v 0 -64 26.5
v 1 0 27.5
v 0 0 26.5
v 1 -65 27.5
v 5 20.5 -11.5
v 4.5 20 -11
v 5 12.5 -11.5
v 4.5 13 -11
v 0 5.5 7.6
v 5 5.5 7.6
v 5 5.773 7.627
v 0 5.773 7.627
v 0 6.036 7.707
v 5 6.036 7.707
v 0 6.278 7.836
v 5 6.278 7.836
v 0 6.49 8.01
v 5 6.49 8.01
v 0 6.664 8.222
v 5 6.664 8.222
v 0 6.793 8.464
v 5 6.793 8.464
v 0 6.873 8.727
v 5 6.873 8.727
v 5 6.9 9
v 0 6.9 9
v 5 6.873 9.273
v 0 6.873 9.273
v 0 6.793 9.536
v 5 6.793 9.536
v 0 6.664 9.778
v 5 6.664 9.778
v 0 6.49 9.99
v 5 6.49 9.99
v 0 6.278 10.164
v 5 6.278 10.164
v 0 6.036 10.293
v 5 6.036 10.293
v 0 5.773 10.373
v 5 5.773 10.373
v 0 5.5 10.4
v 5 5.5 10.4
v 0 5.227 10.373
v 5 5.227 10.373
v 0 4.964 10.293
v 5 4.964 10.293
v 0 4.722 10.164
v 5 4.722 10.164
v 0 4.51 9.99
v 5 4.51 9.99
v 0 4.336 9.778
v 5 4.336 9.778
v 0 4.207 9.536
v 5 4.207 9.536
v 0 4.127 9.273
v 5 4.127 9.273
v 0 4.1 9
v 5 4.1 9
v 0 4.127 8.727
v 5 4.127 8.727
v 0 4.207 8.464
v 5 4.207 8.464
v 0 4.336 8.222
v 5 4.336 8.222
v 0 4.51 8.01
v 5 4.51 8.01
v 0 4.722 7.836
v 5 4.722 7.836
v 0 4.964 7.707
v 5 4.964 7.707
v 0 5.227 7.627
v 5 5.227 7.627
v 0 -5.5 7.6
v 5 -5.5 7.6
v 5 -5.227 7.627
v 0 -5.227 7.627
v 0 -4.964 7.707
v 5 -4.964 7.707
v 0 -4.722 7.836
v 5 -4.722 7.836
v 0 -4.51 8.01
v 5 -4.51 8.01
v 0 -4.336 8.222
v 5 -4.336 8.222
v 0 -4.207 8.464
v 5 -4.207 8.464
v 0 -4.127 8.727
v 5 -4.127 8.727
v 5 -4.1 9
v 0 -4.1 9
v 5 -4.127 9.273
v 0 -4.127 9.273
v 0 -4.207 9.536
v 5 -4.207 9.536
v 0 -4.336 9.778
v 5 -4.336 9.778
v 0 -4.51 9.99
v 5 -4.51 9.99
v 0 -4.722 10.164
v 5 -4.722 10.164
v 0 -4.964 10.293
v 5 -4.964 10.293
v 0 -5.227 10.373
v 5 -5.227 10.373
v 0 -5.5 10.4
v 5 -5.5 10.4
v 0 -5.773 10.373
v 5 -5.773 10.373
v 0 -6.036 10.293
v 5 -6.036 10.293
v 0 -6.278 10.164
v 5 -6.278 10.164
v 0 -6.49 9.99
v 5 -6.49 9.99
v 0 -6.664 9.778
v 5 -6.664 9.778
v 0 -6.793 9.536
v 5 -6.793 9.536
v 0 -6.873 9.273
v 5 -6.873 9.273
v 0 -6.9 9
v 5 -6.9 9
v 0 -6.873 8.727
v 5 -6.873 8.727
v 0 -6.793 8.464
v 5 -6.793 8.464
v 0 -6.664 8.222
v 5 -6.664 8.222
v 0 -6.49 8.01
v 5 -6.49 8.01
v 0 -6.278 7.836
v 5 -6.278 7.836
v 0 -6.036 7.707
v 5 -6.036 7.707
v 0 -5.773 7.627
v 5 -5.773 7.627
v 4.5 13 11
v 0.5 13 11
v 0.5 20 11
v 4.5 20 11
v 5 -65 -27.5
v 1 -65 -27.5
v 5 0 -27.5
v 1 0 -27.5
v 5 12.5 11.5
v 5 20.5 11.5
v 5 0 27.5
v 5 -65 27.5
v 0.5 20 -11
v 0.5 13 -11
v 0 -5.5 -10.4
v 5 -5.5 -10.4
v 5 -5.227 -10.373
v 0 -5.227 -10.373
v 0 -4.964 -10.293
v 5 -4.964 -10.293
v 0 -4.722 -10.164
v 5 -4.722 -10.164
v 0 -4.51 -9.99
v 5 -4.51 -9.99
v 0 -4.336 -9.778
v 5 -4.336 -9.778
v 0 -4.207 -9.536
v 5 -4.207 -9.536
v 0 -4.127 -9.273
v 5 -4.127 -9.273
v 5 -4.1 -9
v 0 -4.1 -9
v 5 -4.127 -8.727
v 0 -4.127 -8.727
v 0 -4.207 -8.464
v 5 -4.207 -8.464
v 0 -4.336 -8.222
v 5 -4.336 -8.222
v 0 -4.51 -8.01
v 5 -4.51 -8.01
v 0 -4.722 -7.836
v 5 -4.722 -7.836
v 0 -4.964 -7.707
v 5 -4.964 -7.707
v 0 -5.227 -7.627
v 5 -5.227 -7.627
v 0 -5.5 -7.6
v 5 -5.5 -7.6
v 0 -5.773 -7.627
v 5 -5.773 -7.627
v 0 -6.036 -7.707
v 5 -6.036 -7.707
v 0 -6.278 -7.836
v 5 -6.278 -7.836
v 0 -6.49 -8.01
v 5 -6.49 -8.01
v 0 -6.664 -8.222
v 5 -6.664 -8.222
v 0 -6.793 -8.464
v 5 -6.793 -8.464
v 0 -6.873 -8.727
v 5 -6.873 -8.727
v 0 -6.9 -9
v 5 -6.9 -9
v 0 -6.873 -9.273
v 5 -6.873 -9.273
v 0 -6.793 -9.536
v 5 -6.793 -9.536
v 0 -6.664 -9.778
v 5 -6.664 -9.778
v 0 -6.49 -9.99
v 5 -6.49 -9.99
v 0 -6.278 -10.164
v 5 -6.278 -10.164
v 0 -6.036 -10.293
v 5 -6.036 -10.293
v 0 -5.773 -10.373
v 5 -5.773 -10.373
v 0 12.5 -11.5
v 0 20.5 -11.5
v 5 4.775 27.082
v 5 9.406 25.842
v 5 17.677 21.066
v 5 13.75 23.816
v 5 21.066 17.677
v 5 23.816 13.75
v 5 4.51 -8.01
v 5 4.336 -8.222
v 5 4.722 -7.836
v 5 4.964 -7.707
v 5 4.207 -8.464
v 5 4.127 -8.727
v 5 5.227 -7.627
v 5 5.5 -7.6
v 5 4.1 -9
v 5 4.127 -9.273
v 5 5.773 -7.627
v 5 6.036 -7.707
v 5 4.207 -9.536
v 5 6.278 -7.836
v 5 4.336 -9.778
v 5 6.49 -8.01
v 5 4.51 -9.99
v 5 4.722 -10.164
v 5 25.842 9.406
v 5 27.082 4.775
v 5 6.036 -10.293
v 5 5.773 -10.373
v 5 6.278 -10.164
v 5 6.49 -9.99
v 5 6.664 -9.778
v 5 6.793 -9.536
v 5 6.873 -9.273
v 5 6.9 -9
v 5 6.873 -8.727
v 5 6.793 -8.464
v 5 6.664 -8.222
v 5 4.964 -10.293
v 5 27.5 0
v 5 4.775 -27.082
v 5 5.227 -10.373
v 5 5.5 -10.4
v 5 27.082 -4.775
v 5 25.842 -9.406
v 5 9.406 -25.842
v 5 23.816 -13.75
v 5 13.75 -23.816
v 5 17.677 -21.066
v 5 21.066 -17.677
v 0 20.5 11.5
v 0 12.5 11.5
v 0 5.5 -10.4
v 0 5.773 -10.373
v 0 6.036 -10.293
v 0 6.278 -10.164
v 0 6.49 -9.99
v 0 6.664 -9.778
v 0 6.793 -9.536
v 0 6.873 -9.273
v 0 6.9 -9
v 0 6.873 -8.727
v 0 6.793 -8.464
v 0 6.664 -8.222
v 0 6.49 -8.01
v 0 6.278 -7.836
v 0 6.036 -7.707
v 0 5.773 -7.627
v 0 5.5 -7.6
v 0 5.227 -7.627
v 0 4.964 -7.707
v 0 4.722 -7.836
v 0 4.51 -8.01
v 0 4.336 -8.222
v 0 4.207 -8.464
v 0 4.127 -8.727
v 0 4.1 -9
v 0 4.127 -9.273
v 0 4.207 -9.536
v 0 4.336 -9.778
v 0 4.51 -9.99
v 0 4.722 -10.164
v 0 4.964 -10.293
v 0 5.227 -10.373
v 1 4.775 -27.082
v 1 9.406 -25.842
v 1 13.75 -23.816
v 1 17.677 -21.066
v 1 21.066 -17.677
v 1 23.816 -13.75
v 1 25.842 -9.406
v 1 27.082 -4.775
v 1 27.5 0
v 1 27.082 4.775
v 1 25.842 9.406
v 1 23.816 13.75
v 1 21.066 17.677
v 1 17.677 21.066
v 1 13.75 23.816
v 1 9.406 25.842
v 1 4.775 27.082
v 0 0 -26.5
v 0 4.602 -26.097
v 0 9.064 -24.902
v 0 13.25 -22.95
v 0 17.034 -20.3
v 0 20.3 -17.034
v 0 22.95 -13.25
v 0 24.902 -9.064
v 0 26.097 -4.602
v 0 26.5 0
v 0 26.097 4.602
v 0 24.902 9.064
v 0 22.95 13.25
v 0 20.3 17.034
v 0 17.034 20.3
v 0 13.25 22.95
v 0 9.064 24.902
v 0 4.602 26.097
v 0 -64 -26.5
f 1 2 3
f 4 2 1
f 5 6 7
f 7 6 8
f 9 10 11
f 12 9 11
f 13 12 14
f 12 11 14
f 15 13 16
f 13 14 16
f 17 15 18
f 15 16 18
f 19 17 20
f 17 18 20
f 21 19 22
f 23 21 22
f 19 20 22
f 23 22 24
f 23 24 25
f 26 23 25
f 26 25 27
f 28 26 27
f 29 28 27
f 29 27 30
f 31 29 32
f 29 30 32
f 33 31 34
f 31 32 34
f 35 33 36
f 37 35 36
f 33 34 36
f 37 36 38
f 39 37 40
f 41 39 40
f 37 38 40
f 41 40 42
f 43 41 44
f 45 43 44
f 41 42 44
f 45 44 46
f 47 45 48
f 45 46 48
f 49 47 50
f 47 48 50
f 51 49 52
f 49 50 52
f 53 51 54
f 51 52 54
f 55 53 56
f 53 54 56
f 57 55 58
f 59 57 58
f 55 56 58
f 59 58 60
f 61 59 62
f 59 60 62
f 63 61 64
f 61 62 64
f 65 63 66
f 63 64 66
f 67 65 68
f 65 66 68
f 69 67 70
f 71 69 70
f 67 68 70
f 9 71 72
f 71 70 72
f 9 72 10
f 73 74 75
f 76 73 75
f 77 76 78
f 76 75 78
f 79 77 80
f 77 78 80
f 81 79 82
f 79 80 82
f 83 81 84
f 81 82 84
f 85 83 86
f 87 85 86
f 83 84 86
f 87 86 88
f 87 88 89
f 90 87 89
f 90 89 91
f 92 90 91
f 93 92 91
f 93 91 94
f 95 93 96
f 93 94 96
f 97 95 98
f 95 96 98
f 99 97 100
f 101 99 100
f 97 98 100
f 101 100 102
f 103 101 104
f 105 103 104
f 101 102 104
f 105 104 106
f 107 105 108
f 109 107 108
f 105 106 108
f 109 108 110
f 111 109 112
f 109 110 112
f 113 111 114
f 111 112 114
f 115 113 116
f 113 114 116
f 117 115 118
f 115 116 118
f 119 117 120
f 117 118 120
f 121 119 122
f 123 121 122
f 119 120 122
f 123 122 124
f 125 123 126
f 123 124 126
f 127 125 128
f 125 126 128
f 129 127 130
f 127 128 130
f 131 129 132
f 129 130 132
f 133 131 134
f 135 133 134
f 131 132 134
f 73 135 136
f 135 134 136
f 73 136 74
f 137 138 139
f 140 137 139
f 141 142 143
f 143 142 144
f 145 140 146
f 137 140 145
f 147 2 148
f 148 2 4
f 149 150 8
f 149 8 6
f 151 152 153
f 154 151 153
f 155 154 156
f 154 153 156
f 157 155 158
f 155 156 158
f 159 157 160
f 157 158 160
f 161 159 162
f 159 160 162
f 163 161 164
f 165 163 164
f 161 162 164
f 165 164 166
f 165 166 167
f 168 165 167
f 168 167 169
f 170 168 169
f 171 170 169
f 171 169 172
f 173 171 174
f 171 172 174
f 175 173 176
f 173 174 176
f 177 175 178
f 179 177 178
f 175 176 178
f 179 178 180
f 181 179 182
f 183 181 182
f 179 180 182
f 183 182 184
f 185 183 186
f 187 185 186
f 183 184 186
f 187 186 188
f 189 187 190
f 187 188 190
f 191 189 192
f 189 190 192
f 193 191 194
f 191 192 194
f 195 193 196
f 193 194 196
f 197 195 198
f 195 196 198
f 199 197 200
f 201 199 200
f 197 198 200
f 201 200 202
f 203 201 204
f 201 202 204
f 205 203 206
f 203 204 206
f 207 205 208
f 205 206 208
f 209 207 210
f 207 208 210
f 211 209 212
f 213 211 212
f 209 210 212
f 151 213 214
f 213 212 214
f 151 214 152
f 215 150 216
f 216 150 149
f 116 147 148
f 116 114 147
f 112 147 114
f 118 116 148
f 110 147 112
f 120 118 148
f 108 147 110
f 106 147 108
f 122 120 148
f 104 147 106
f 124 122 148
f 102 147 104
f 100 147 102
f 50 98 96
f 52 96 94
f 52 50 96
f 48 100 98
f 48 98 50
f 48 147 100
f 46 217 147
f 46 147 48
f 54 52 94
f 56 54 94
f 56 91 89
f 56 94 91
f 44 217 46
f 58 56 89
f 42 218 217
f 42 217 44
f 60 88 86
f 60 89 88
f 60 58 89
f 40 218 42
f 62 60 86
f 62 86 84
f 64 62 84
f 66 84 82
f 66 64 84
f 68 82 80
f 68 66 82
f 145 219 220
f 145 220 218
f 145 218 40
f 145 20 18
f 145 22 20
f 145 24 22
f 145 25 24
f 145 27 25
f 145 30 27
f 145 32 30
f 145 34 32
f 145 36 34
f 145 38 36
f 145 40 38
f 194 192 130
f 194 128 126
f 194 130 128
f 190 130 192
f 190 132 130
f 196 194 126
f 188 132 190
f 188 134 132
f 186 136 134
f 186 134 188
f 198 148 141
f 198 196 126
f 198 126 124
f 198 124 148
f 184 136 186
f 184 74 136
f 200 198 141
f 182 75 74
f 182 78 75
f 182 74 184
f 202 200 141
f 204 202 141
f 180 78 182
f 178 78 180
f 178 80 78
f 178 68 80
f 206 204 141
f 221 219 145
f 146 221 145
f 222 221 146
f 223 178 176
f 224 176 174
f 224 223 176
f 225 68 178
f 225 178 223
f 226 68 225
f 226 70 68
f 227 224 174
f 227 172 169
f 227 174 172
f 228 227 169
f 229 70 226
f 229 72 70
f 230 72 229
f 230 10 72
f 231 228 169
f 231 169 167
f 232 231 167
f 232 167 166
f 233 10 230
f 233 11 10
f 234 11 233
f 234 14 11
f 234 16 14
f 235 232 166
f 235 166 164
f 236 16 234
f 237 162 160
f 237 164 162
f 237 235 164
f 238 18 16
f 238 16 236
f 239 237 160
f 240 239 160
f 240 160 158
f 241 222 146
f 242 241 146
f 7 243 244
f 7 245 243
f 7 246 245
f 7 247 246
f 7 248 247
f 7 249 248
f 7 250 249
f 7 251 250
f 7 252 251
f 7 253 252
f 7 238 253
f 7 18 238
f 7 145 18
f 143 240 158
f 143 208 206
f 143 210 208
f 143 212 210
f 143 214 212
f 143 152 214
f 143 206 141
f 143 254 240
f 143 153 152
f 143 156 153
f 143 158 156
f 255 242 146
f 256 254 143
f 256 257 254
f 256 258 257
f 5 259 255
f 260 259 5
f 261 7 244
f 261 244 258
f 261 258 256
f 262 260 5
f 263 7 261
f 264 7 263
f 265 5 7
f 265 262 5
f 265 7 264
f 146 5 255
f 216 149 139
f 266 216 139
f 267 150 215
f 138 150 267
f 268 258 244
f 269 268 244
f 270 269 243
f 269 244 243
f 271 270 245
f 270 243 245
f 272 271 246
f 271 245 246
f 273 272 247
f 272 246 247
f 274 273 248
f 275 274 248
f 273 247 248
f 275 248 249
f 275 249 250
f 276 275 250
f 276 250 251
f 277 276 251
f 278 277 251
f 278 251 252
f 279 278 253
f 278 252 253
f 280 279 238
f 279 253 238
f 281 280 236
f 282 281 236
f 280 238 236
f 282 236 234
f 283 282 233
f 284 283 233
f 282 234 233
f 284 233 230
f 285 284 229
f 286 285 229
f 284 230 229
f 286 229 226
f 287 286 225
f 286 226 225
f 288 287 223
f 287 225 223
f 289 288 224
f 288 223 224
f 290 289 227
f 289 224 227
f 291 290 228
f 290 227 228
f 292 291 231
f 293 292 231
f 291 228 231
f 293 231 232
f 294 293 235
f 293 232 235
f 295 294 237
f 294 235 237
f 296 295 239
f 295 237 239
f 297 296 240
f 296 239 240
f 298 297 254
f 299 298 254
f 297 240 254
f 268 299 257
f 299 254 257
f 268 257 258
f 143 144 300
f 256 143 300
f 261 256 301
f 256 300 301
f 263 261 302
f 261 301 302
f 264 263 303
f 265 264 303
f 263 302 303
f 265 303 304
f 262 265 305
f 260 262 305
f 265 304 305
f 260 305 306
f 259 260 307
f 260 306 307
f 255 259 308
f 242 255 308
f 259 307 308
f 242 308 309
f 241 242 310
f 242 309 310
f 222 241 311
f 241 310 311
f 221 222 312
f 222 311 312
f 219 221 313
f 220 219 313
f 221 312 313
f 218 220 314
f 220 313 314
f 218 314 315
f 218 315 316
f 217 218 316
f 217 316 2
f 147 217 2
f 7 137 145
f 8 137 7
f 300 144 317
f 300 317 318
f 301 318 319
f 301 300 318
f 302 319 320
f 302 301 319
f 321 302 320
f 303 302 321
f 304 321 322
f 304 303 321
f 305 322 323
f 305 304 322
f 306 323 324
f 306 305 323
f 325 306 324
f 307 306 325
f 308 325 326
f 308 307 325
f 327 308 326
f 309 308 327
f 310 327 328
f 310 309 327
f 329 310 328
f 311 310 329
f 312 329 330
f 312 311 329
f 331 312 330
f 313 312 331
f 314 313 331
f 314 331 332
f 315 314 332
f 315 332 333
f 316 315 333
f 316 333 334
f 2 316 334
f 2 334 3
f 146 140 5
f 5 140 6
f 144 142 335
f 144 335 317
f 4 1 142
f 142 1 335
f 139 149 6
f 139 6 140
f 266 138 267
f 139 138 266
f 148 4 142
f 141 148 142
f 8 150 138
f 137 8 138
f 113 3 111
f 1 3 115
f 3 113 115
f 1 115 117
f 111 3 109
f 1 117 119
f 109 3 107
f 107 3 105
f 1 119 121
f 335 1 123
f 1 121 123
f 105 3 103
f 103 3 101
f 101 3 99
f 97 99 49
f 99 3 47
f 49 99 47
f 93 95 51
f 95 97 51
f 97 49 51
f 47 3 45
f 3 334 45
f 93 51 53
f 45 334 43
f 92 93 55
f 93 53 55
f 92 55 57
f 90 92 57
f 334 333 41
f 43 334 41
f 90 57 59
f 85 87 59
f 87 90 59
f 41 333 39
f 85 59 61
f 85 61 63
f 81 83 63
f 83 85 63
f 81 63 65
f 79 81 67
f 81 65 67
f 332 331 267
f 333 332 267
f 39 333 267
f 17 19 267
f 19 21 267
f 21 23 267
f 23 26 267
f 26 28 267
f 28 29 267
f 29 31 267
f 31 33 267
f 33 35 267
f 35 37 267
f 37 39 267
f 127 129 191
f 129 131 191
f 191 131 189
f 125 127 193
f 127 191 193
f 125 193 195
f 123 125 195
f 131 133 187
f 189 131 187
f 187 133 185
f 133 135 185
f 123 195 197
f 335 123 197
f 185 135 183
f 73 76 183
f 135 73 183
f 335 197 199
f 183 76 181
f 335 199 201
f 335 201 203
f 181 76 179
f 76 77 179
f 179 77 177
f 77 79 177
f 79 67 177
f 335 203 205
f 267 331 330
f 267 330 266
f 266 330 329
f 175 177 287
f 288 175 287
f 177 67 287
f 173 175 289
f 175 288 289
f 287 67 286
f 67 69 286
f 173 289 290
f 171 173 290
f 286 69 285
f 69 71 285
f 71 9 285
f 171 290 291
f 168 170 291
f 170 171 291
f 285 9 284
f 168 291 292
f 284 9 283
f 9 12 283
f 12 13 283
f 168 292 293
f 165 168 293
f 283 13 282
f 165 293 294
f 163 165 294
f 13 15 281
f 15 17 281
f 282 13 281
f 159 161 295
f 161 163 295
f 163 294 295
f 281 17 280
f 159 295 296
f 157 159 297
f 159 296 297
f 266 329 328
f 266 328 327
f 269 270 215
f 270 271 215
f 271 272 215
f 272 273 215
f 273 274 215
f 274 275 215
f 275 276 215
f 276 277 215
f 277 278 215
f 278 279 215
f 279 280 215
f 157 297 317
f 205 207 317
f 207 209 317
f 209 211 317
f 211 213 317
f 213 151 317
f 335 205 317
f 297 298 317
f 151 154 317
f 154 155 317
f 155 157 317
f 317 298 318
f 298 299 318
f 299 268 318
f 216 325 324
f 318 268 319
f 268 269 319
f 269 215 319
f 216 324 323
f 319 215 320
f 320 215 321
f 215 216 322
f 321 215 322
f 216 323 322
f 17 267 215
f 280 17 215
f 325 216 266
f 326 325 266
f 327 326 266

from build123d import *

# Parameters (mm, degrees)
EXTRUDE_1_DEPTH     = 5
SKETCH_2_R          = 1.4
CUT_EXTRUDE_1_DEPTH = 5
CHAMFER_1_SIZE      = 1
SKETCH_4_W          = 22
SKETCH_4_H          = 7
CUT_EXTRUDE_4_DEPTH = 10
CHAMFER_2_SIZE      = 0.5


with BuildPart() as part:
    # 草图1 → 凸台-拉伸1 (new body)
    with BuildSketch(Plane(origin=(0, 0, 0), x_dir=(0, 0, -1), z_dir=(1, 0, 0))):
        with BuildLine():
            Line((-27.5, 0), (-27.5, -65))
            Line((-27.5, -65), (27.5, -65))
            Line((27.5, -65), (27.5, 0))
            ThreePointArc((27.5, 0), (0, 27.5), (-27.5, 0))
        make_face()
    extrude(amount=EXTRUDE_1_DEPTH)

    # 草图2 → 切除-拉伸1 (cut)
    with BuildSketch(Plane(origin=(5, 0, 0), x_dir=(0, 0, -1), z_dir=(1, 0, 0))):
        with Locations((-9, 5.5)):
            Circle(SKETCH_2_R)
        with Locations((9, 5.5)):
            Circle(SKETCH_2_R)
        with Locations((9, -5.5)):
            Circle(SKETCH_2_R)
        with Locations((-9, -5.5)):
            Circle(SKETCH_2_R)
    extrude(amount=-CUT_EXTRUDE_1_DEPTH, mode=Mode.SUBTRACT)

    # 倒角1
    chamfer_1_edges = [part.edges().sort_by_distance(p)[0] for p in [
        (0, -32.5, -27.5),
        (0, -65, 0),
        (0, -32.5, 27.5),
        (0, 27.5, 0),
    ]]
    chamfer(chamfer_1_edges, length=CHAMFER_1_SIZE)

    # 草图4 → 切除-拉伸4 (cut)
    with BuildSketch(Plane.ZY):
        with Locations((0, 16.5)):
            Rectangle(SKETCH_4_W, SKETCH_4_H)
    extrude(amount=-CUT_EXTRUDE_4_DEPTH, mode=Mode.SUBTRACT)

    # 倒角2
    chamfer_2_edges = [part.edges().sort_by_distance(p)[0] for p in [
        (5, 16.5, -11),
        (5, 20, 0),
        (5, 16.5, 11),
        (5, 13, 0),
        (0, 16.5, -11),
        (0, 13, 0),
        (0, 16.5, 11),
        (0, 20, 0),
    ]]
    chamfer(chamfer_2_edges, length=CHAMFER_2_SIZE)


solid = part.part
